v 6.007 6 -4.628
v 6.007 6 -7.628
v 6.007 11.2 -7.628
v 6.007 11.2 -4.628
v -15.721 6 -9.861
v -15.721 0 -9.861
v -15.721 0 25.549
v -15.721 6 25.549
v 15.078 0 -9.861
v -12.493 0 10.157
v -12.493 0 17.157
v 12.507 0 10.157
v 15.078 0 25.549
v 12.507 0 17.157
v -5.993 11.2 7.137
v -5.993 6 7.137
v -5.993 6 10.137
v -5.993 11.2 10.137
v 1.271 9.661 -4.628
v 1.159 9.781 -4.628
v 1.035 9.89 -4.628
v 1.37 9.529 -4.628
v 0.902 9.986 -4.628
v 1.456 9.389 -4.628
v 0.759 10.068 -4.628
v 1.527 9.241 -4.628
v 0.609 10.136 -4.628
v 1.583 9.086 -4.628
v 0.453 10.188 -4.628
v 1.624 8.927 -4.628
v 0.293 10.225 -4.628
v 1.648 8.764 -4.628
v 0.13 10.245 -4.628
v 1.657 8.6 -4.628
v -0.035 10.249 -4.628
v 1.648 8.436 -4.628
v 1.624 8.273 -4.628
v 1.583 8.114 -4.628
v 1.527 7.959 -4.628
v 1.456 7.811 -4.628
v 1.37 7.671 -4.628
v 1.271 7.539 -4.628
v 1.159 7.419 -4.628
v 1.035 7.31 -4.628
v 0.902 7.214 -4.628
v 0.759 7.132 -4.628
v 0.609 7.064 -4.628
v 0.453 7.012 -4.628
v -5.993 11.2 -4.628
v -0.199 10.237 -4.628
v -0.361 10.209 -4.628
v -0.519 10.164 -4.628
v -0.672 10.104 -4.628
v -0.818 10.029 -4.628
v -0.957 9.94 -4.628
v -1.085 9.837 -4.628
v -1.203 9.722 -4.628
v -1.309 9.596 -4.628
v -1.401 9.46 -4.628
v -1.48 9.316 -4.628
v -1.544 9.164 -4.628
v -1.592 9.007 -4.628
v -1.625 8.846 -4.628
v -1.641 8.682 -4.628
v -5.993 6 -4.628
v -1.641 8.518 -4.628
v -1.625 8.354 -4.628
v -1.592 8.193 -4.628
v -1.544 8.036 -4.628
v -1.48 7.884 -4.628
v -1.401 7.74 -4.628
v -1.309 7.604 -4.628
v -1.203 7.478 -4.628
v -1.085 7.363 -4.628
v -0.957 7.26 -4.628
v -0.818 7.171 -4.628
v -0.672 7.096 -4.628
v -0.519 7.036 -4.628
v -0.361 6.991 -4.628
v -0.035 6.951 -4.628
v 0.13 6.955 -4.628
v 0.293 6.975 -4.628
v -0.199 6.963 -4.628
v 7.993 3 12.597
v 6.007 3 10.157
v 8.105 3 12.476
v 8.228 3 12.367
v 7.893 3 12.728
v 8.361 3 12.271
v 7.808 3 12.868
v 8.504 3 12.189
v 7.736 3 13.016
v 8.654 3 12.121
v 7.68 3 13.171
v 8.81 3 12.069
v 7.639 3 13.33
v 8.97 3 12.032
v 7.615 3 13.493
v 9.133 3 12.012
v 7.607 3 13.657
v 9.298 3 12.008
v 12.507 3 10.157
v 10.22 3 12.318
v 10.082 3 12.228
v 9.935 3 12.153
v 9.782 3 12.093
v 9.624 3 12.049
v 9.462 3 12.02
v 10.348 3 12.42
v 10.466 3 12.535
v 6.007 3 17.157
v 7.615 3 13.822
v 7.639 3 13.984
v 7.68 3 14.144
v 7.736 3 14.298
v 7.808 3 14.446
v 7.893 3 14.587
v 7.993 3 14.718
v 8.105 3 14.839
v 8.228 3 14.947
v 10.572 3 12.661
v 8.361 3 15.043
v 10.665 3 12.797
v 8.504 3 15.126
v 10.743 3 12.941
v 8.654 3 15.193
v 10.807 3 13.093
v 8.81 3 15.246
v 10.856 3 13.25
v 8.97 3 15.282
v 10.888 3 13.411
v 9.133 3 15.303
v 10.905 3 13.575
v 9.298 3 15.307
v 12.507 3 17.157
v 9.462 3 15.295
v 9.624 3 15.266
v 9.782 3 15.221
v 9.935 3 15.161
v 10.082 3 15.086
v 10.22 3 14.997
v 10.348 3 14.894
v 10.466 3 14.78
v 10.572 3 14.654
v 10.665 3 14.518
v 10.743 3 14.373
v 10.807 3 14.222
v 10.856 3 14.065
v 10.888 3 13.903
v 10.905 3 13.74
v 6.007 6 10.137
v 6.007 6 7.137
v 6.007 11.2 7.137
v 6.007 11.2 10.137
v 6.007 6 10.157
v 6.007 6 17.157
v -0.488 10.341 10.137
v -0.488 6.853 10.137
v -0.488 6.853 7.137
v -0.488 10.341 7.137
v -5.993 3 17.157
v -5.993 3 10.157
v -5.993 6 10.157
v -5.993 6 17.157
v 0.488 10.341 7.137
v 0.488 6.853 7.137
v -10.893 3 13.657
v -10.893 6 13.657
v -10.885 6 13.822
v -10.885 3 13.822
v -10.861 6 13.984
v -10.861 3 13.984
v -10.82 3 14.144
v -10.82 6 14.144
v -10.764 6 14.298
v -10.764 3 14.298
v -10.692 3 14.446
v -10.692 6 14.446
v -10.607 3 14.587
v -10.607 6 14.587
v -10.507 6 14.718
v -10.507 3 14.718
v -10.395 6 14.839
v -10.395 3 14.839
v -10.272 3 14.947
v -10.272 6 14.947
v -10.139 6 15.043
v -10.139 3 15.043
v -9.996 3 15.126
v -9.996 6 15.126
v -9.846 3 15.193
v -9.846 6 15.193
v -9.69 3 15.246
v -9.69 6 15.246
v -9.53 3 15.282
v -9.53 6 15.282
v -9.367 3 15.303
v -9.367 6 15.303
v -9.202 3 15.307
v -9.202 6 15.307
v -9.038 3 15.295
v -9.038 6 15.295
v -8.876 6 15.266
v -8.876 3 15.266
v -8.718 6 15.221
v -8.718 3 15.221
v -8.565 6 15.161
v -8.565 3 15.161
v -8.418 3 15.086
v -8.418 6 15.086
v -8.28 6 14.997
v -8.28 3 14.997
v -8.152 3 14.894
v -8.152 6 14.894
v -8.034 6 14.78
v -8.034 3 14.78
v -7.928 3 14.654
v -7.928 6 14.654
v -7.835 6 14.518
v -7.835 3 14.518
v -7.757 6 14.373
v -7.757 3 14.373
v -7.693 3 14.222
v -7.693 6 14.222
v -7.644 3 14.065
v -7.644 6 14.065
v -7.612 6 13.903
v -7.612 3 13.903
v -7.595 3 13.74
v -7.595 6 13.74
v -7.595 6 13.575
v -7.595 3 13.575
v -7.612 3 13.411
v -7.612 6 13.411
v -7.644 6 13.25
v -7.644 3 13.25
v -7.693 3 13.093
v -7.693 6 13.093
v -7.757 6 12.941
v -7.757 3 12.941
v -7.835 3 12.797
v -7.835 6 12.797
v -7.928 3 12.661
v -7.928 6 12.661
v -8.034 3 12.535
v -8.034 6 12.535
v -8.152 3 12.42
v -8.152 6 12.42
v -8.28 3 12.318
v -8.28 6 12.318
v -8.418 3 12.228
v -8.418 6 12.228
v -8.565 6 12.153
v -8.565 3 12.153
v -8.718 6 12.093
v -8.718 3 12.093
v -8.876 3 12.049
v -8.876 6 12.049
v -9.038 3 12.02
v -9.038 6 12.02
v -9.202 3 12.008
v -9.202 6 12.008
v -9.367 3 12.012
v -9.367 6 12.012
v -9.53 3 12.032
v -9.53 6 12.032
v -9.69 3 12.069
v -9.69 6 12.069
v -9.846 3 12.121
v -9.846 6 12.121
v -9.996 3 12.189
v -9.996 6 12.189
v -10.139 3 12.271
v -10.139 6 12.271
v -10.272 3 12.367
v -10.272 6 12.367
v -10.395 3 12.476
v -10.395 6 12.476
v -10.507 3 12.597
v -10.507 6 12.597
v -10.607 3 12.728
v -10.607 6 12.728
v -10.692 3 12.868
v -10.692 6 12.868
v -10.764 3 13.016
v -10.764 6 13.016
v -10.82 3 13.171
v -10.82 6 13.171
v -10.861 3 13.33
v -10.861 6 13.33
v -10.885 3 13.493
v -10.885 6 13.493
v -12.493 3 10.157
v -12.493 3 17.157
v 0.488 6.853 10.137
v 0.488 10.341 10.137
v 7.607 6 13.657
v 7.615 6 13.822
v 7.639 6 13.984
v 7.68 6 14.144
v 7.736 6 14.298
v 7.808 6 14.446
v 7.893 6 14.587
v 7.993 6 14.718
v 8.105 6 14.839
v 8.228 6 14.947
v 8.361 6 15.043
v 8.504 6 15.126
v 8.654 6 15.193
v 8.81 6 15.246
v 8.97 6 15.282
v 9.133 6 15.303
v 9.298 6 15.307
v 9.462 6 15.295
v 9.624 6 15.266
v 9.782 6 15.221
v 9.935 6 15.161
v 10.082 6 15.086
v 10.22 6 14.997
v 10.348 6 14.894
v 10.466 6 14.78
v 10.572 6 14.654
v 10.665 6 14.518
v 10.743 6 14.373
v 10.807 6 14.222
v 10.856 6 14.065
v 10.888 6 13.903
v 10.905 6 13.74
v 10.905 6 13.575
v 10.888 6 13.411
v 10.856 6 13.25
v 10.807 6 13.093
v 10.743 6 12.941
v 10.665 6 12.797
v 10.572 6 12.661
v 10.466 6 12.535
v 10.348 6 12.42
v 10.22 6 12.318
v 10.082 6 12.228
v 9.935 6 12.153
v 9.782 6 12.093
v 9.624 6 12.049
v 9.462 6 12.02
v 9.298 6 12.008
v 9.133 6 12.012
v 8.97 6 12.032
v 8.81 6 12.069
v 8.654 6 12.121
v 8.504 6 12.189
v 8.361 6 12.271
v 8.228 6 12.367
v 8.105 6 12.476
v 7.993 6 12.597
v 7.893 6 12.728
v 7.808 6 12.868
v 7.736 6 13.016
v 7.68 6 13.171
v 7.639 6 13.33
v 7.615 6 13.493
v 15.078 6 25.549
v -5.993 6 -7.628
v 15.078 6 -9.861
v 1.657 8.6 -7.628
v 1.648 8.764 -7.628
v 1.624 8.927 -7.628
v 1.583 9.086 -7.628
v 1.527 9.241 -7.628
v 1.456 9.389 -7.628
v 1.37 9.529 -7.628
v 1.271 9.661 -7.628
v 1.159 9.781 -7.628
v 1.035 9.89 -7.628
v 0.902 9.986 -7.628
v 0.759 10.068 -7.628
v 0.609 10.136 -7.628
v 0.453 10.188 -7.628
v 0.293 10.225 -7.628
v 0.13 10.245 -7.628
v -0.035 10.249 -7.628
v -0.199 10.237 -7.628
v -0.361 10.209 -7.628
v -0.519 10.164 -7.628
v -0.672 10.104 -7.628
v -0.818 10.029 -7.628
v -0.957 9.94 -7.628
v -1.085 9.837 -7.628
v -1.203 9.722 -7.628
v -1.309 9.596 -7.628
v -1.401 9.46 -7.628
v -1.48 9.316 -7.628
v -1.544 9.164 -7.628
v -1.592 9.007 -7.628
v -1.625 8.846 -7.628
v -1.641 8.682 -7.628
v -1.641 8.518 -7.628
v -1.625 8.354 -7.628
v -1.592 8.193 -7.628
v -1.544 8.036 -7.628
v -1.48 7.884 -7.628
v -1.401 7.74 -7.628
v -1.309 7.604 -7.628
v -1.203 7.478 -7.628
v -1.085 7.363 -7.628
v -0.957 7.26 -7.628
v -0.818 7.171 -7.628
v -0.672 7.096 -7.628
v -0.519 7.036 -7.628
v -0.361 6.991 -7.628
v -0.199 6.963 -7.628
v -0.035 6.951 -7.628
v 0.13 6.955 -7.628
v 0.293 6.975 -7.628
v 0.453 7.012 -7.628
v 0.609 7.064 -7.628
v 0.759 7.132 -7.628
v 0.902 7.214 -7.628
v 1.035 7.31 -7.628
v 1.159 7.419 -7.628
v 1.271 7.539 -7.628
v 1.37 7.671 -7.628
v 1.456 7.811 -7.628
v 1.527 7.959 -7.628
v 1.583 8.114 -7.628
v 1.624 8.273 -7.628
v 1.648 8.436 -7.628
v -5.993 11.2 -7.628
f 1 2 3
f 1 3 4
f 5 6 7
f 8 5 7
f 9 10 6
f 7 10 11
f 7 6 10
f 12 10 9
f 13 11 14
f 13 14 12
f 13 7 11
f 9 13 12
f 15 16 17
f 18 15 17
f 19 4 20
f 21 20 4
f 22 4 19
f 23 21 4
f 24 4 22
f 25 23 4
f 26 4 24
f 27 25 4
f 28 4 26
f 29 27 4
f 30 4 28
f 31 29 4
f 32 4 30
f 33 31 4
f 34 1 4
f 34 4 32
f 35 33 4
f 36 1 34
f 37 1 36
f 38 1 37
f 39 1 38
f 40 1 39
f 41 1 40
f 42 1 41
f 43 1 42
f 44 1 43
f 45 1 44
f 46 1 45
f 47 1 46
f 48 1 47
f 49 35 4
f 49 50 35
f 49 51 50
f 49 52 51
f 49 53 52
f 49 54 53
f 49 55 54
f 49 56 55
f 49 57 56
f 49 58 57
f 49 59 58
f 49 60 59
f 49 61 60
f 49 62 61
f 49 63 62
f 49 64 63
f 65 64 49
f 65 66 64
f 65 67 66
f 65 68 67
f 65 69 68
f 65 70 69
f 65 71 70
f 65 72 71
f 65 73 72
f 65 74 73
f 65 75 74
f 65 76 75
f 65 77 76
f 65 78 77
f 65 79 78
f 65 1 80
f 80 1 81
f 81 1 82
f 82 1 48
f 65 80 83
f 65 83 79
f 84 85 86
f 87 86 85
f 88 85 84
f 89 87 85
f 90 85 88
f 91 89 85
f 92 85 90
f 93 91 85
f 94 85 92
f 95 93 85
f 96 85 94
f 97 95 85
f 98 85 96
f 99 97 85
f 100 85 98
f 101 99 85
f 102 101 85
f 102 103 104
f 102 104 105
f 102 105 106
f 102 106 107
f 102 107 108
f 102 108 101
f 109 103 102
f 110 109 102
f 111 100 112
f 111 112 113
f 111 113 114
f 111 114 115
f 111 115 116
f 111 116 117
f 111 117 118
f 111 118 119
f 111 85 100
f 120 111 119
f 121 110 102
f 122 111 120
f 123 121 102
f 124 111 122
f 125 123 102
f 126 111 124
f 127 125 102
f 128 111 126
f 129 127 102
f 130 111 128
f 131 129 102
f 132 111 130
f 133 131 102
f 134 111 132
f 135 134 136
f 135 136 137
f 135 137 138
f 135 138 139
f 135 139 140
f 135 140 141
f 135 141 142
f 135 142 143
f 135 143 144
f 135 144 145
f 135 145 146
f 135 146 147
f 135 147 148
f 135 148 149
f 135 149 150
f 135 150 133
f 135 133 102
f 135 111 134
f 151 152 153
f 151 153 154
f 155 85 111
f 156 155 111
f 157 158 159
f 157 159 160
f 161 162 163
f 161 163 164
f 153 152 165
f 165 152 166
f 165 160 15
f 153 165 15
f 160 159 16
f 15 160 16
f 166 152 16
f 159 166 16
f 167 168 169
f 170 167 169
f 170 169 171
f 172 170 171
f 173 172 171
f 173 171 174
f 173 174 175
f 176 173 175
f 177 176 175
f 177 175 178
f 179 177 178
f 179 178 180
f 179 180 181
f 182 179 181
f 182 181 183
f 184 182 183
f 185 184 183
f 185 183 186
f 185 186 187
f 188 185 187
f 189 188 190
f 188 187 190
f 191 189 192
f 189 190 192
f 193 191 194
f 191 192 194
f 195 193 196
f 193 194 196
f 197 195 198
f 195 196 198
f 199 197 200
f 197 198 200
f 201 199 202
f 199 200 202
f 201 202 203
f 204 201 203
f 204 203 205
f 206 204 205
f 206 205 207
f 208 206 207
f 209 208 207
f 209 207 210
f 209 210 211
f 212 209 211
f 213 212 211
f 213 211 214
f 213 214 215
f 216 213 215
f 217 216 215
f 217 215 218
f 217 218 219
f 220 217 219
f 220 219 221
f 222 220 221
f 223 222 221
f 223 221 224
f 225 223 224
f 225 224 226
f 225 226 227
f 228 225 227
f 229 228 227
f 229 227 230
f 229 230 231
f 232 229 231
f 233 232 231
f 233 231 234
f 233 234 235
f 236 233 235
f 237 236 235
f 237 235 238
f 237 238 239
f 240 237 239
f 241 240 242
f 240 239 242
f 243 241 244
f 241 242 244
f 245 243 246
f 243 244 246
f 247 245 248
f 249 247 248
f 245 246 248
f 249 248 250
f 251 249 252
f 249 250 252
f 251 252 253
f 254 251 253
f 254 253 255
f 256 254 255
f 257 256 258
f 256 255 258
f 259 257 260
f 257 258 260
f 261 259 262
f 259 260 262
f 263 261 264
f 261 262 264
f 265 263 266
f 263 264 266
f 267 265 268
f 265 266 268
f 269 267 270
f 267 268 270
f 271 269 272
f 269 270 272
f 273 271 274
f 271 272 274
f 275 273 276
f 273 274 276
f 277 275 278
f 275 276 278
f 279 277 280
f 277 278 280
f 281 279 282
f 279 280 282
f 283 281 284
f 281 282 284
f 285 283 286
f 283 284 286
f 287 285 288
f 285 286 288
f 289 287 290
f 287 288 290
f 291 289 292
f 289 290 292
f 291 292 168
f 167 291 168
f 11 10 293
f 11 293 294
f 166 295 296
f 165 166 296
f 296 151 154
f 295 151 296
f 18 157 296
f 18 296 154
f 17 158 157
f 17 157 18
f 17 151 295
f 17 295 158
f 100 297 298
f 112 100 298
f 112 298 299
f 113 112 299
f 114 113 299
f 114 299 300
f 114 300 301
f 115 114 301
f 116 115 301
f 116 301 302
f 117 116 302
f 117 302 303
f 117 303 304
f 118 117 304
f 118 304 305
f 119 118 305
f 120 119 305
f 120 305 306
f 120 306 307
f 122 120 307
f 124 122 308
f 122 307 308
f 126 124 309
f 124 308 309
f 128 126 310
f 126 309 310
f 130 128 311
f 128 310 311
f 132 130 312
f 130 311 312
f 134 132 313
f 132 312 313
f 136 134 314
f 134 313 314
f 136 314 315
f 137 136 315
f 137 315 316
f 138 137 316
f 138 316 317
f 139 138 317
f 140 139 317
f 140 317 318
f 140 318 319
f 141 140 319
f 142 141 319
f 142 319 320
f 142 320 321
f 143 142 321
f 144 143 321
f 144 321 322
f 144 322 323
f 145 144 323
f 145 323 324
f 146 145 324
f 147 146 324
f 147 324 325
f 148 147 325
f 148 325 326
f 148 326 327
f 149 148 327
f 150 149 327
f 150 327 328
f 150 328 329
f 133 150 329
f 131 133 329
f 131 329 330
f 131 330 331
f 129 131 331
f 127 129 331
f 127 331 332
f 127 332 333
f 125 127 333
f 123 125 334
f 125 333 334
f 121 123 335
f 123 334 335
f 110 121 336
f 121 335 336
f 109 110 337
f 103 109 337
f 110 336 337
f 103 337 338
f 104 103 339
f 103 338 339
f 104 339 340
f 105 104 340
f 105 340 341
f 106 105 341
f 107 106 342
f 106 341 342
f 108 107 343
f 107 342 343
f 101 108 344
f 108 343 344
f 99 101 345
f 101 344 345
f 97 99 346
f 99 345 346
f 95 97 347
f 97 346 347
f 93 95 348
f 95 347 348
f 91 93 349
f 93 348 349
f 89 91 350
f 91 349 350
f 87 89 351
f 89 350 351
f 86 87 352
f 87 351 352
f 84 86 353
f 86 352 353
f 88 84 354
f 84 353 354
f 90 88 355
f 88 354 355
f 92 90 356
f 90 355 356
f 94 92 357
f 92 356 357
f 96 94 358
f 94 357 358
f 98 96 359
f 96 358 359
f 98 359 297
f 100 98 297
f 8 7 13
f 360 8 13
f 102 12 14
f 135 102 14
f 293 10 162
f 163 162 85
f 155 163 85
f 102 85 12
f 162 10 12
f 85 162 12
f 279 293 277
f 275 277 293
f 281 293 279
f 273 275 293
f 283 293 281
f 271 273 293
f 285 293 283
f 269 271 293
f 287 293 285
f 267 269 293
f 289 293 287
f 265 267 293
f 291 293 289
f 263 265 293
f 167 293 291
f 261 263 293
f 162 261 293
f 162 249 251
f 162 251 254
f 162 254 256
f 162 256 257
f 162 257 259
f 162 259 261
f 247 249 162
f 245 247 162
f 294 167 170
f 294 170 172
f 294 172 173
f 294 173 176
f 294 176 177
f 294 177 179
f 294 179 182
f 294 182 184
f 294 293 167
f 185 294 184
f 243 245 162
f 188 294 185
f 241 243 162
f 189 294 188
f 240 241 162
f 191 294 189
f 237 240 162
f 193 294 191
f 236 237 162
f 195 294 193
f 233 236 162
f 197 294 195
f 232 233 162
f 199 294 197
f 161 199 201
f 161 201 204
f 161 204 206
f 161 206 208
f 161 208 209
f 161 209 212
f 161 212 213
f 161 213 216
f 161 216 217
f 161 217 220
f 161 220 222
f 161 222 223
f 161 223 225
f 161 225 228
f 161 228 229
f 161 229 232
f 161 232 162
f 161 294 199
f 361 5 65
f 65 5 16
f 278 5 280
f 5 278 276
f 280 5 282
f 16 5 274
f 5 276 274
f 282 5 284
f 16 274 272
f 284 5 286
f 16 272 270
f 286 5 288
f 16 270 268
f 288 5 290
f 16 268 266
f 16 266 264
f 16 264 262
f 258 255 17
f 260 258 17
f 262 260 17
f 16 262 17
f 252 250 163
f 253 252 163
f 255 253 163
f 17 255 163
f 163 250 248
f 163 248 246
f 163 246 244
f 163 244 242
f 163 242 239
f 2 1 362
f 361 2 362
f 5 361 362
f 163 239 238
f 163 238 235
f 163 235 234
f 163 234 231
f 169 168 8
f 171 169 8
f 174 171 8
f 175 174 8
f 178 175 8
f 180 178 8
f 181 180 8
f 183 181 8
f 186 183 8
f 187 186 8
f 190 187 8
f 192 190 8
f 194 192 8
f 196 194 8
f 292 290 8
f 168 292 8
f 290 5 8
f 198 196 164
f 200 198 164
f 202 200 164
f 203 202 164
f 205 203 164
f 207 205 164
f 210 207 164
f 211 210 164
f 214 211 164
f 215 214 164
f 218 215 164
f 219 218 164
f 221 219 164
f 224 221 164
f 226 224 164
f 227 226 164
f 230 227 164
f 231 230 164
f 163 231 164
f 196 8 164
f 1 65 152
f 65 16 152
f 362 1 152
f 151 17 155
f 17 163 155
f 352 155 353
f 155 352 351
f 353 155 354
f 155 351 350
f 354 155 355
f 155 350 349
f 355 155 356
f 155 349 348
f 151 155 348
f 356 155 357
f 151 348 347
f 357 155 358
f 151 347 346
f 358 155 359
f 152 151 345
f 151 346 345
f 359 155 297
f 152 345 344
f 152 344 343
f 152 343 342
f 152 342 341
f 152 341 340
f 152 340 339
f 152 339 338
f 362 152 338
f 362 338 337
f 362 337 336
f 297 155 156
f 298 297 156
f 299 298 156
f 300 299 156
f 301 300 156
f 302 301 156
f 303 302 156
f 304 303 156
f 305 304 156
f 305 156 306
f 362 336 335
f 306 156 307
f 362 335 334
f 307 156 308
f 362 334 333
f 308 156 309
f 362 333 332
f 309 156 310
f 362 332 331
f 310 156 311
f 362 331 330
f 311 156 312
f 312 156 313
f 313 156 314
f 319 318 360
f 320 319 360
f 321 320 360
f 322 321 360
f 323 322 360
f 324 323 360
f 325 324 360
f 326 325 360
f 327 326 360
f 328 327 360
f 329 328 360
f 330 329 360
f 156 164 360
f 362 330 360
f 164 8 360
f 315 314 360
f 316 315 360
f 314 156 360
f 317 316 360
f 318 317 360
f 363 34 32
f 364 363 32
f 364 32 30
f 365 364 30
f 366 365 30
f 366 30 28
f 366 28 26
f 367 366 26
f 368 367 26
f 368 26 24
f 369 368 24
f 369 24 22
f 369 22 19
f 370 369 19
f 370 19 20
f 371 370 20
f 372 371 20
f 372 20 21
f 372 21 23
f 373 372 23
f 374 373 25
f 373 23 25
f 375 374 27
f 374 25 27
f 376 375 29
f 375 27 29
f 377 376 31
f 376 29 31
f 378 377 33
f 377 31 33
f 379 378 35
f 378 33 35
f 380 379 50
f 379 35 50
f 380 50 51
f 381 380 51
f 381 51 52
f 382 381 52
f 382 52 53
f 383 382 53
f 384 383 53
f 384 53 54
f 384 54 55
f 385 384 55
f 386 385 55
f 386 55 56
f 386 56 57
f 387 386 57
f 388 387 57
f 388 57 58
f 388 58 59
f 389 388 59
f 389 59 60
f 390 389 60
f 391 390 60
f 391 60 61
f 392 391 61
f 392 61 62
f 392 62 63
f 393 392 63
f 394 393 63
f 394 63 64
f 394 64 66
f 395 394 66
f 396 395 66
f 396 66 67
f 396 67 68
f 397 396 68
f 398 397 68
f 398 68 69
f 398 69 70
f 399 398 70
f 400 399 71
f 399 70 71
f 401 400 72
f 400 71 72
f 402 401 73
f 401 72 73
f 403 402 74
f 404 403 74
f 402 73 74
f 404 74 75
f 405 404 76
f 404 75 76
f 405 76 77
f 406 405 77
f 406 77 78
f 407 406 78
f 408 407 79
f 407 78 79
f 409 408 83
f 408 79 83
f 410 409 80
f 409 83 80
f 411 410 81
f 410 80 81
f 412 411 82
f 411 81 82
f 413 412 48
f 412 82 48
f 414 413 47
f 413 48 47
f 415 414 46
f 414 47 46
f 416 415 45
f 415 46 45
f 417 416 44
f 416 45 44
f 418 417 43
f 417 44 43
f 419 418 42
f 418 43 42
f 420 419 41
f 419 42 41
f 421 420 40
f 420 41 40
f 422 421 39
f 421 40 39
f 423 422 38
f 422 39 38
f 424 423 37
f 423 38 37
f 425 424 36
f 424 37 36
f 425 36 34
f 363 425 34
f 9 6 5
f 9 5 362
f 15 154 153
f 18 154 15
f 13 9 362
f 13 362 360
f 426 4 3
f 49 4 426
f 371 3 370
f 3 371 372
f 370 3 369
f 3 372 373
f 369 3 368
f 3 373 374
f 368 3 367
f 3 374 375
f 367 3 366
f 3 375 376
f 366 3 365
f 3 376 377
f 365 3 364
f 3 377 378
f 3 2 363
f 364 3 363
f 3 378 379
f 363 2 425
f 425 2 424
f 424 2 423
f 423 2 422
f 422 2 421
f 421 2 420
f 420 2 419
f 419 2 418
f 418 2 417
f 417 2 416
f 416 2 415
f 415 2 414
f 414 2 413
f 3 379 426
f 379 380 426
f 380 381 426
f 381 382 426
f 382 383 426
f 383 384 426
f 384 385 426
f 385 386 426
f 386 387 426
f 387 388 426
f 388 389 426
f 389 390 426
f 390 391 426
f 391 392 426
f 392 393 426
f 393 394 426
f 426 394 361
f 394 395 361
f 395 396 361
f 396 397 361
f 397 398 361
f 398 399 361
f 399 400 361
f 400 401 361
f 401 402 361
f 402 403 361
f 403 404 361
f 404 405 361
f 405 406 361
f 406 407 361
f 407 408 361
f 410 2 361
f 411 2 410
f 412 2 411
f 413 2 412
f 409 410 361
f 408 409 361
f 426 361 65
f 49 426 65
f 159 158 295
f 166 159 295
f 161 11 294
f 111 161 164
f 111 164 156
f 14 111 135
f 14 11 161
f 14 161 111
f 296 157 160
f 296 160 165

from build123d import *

# Parameters (mm, degrees)
F0_W     = 30.7991821319
F0_H     = 35.4098370299
F0_W_2   = 6.5
F0_H_2   = 7
F1_DEPTH = 6
F2_DEPTH = 3
F3_D     = 3.3
F4_W     = 12
F4_H     = 3
F5_DEPTH = 5.2
F6_W     = 0.9753258782
F6_H     = 3.4873990223
F7_DEPTH = 3
F9_D     = 3.3
F9_DEPTH = 5.2341906781


with BuildPart() as f1:
    # F0 (on Front) → F1 (new body)
    with BuildSketch(Plane.XZ):
        with Locations((-0.321273692, 7.8438320197)):
            Rectangle(F0_W, F0_H)
        Polygon((-12.4934045598, 17.1573571861), (-5.9934045598, 17.1573571861), (6.0065954402, 17.1573571861), (12.5065954402, 17.1573571861), (12.5065954402, 10.1573571861), (6.0065954402, 10.1573571861), (-5.9934045598, 10.1573571861), (-12.4934045598, 10.1573571861), align=None, mode=Mode.SUBTRACT)
        with Locations((-9.2434045598, 13.6573571861)):
            Rectangle(F0_W_2, F0_H_2)
        with Locations((9.2565954402, 13.6573571861)):
            Rectangle(F0_W_2, F0_H_2)
    extrude(amount=-F1_DEPTH)

    # F0 (on Front) → F2 (cut)
    with BuildSketch(Plane.XZ):
        with Locations((-9.2434045598, 13.6573571861)):
            Rectangle(F0_W_2, F0_H_2)
        with Locations((9.2565954402, 13.6573571861)):
            Rectangle(F0_W_2, F0_H_2)
    extrude(amount=-F2_DEPTH, mode=Mode.SUBTRACT)

    # F3 (through all)
    with Locations(Plane.XZ):
        with Locations((-9.2434045598, 13.6573571861), (9.2565954402, 13.6573571861)):
            Hole(F3_D / 2)

    # F4 (on face) → F5 (join)
    with BuildSketch(Plane(origin=(0, 6, 0), x_dir=(-1, 0, 0), z_dir=(0, 1, 0))):
        with Locations((-0.0065954402, -6.1278958172)):
            Rectangle(F4_W, F4_H)
        with Locations((-0.0065954402, 8.6368762217)):
            Rectangle(F4_W, F4_H)
    extrude(amount=F5_DEPTH)

    # F6 (on face) → F7 (cut, through all)
    with BuildSketch(Plane.XY.offset(10.1368762217)):
        with Locations((0, 8.5971419759)):
            Rectangle(F6_W, F6_H)
    extrude(amount=-F7_DEPTH, mode=Mode.SUBTRACT)

    # F9 (through all, one way)
    with BuildSketch(Plane.XY.offset(-4.6278958172)):
        with Locations((0.0065954402, 8.6)):
            Circle(F9_D / 2)
    extrude(amount=-F9_DEPTH, mode=Mode.SUBTRACT)


solid = f1.part
